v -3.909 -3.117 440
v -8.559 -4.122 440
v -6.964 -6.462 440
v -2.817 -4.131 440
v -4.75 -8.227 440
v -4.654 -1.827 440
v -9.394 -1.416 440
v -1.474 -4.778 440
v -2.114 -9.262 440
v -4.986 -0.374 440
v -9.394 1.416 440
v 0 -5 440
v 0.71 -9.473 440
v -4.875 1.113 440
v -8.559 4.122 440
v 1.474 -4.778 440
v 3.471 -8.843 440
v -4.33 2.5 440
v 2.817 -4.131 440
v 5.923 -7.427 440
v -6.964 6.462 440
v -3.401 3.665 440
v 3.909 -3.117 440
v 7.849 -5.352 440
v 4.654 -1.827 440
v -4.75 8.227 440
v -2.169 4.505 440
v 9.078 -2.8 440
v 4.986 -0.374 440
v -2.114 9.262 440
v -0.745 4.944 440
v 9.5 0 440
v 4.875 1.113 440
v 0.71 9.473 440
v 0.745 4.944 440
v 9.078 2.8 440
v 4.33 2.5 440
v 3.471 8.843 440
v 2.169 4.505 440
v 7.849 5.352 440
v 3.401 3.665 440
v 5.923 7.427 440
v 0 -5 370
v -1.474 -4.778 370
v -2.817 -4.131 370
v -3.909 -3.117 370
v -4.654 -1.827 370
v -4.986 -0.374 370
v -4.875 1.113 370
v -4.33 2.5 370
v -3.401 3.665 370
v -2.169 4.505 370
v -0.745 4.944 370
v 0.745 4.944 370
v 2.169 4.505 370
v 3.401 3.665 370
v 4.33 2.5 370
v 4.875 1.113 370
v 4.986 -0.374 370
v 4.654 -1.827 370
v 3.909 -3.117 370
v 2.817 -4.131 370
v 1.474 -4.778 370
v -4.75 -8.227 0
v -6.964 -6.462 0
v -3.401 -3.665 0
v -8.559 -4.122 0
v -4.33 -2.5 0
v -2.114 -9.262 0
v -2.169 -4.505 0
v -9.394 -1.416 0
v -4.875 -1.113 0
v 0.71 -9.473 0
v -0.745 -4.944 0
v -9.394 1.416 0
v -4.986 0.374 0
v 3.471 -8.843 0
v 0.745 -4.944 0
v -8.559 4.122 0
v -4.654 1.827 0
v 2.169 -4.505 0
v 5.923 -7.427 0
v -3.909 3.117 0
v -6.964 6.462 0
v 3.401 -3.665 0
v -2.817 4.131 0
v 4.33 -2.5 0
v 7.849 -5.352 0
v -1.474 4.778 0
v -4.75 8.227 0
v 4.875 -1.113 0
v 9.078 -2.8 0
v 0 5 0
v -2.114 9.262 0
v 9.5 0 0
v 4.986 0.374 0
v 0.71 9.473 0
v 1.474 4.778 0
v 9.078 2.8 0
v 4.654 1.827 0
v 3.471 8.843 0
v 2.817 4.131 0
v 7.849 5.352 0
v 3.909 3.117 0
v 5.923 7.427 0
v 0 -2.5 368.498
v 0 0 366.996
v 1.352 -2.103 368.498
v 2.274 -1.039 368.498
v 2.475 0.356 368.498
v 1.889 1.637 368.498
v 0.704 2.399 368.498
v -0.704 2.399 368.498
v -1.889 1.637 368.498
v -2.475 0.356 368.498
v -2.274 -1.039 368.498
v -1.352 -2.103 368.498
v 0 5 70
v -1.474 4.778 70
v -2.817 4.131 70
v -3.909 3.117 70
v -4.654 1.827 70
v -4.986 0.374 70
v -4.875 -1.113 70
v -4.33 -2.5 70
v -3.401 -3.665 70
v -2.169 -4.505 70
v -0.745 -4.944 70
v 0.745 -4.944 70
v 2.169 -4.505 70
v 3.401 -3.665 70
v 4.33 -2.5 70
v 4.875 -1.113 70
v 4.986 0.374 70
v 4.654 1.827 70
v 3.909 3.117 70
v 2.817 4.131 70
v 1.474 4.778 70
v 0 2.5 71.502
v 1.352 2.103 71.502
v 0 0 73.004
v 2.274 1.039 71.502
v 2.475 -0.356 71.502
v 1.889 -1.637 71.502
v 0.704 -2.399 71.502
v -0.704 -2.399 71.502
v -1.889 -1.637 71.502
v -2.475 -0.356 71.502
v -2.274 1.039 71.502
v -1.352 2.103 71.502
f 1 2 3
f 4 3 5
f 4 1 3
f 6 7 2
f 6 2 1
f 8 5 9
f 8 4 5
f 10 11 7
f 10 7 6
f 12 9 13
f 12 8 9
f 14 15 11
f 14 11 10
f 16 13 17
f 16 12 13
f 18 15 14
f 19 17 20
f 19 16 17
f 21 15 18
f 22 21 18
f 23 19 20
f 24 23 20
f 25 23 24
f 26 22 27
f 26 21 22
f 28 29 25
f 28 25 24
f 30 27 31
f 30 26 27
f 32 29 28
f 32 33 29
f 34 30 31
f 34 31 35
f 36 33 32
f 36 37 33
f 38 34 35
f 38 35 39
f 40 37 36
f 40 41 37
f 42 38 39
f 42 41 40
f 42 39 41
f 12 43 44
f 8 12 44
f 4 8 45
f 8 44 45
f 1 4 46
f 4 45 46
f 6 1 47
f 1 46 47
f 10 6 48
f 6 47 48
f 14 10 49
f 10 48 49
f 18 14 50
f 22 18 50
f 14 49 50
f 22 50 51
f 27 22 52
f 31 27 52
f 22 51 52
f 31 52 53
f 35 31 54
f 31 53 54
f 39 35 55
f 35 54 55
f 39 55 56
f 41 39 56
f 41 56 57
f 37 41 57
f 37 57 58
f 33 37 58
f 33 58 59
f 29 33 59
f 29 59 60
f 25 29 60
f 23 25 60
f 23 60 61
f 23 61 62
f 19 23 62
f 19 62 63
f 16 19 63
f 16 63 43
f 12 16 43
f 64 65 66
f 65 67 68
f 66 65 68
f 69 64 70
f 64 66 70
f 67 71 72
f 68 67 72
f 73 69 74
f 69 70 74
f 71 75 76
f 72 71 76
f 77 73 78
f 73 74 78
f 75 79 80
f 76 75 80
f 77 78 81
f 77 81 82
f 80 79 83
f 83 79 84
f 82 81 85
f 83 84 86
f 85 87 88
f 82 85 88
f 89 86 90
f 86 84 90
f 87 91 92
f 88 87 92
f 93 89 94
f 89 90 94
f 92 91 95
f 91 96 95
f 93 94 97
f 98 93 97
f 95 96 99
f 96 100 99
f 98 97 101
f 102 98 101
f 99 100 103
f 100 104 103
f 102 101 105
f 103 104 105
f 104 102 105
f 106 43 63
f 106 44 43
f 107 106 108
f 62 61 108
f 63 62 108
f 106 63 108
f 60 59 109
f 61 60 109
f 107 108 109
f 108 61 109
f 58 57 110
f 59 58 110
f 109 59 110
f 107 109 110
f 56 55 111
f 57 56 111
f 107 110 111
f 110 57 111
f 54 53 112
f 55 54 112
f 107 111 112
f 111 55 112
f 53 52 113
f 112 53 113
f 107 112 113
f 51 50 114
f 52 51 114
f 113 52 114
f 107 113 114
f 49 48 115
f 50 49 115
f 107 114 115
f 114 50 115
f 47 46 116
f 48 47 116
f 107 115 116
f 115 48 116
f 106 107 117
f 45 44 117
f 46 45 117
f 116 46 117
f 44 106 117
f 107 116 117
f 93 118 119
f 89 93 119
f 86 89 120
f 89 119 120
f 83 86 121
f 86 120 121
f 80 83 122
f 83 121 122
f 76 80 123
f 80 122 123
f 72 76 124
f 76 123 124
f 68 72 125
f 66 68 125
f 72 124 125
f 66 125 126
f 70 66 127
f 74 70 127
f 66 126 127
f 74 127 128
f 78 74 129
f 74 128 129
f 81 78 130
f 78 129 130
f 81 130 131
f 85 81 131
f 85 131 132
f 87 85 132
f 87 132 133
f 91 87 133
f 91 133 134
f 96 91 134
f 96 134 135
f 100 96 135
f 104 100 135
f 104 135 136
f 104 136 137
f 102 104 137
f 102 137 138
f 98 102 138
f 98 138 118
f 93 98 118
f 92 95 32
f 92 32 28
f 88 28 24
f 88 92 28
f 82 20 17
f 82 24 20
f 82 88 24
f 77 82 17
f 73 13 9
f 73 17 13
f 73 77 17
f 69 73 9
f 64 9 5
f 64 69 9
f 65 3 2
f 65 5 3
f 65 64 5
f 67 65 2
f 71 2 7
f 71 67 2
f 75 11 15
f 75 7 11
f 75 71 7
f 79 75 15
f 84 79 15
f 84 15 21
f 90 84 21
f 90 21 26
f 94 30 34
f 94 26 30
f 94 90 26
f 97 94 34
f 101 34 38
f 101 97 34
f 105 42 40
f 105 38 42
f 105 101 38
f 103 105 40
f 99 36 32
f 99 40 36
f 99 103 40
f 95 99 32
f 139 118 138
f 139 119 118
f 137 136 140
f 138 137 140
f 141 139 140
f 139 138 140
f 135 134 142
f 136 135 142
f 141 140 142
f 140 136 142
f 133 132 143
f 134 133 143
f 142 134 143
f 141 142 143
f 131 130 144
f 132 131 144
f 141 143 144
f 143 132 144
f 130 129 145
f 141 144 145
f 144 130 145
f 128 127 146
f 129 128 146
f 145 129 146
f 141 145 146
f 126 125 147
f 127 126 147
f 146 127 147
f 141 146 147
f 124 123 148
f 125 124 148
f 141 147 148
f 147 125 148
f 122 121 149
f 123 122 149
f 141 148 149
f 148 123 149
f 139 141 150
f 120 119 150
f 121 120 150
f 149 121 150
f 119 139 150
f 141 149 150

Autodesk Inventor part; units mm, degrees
ref_plane "YZ Plane" through (0, 0, 0) normal (1, 0, 0) x (0, 1, 0)
ref_plane "XZ Plane" through (0, 0, 0) normal (0, 1, 0) x (-1, 0, 0)
ref_plane "XY Plane" through (0, 0, 0) normal (0, 0, 1) x (1, 0, 0)
sketch "Sketch1" plane through (0, 0, 0) normal (0, 0, 1) x (1, 0, 0)
  circle A0 centre (0, 0) radius 9.5
  dimension "d0" = 19
extrude "Extrusion1" add sketch "Sketch1" along normal blind 440
hole "Hole1" at (0, 0, 440) direction (0, 0, -1) diameter 10 depth 70 tip angle 118
hole "Hole2" at (0, 0, 0) direction (0, 0, 1) diameter 10 depth 70 tip angle 118
properties part number "Barra-garfo" material "Aluminium AW-7020"
